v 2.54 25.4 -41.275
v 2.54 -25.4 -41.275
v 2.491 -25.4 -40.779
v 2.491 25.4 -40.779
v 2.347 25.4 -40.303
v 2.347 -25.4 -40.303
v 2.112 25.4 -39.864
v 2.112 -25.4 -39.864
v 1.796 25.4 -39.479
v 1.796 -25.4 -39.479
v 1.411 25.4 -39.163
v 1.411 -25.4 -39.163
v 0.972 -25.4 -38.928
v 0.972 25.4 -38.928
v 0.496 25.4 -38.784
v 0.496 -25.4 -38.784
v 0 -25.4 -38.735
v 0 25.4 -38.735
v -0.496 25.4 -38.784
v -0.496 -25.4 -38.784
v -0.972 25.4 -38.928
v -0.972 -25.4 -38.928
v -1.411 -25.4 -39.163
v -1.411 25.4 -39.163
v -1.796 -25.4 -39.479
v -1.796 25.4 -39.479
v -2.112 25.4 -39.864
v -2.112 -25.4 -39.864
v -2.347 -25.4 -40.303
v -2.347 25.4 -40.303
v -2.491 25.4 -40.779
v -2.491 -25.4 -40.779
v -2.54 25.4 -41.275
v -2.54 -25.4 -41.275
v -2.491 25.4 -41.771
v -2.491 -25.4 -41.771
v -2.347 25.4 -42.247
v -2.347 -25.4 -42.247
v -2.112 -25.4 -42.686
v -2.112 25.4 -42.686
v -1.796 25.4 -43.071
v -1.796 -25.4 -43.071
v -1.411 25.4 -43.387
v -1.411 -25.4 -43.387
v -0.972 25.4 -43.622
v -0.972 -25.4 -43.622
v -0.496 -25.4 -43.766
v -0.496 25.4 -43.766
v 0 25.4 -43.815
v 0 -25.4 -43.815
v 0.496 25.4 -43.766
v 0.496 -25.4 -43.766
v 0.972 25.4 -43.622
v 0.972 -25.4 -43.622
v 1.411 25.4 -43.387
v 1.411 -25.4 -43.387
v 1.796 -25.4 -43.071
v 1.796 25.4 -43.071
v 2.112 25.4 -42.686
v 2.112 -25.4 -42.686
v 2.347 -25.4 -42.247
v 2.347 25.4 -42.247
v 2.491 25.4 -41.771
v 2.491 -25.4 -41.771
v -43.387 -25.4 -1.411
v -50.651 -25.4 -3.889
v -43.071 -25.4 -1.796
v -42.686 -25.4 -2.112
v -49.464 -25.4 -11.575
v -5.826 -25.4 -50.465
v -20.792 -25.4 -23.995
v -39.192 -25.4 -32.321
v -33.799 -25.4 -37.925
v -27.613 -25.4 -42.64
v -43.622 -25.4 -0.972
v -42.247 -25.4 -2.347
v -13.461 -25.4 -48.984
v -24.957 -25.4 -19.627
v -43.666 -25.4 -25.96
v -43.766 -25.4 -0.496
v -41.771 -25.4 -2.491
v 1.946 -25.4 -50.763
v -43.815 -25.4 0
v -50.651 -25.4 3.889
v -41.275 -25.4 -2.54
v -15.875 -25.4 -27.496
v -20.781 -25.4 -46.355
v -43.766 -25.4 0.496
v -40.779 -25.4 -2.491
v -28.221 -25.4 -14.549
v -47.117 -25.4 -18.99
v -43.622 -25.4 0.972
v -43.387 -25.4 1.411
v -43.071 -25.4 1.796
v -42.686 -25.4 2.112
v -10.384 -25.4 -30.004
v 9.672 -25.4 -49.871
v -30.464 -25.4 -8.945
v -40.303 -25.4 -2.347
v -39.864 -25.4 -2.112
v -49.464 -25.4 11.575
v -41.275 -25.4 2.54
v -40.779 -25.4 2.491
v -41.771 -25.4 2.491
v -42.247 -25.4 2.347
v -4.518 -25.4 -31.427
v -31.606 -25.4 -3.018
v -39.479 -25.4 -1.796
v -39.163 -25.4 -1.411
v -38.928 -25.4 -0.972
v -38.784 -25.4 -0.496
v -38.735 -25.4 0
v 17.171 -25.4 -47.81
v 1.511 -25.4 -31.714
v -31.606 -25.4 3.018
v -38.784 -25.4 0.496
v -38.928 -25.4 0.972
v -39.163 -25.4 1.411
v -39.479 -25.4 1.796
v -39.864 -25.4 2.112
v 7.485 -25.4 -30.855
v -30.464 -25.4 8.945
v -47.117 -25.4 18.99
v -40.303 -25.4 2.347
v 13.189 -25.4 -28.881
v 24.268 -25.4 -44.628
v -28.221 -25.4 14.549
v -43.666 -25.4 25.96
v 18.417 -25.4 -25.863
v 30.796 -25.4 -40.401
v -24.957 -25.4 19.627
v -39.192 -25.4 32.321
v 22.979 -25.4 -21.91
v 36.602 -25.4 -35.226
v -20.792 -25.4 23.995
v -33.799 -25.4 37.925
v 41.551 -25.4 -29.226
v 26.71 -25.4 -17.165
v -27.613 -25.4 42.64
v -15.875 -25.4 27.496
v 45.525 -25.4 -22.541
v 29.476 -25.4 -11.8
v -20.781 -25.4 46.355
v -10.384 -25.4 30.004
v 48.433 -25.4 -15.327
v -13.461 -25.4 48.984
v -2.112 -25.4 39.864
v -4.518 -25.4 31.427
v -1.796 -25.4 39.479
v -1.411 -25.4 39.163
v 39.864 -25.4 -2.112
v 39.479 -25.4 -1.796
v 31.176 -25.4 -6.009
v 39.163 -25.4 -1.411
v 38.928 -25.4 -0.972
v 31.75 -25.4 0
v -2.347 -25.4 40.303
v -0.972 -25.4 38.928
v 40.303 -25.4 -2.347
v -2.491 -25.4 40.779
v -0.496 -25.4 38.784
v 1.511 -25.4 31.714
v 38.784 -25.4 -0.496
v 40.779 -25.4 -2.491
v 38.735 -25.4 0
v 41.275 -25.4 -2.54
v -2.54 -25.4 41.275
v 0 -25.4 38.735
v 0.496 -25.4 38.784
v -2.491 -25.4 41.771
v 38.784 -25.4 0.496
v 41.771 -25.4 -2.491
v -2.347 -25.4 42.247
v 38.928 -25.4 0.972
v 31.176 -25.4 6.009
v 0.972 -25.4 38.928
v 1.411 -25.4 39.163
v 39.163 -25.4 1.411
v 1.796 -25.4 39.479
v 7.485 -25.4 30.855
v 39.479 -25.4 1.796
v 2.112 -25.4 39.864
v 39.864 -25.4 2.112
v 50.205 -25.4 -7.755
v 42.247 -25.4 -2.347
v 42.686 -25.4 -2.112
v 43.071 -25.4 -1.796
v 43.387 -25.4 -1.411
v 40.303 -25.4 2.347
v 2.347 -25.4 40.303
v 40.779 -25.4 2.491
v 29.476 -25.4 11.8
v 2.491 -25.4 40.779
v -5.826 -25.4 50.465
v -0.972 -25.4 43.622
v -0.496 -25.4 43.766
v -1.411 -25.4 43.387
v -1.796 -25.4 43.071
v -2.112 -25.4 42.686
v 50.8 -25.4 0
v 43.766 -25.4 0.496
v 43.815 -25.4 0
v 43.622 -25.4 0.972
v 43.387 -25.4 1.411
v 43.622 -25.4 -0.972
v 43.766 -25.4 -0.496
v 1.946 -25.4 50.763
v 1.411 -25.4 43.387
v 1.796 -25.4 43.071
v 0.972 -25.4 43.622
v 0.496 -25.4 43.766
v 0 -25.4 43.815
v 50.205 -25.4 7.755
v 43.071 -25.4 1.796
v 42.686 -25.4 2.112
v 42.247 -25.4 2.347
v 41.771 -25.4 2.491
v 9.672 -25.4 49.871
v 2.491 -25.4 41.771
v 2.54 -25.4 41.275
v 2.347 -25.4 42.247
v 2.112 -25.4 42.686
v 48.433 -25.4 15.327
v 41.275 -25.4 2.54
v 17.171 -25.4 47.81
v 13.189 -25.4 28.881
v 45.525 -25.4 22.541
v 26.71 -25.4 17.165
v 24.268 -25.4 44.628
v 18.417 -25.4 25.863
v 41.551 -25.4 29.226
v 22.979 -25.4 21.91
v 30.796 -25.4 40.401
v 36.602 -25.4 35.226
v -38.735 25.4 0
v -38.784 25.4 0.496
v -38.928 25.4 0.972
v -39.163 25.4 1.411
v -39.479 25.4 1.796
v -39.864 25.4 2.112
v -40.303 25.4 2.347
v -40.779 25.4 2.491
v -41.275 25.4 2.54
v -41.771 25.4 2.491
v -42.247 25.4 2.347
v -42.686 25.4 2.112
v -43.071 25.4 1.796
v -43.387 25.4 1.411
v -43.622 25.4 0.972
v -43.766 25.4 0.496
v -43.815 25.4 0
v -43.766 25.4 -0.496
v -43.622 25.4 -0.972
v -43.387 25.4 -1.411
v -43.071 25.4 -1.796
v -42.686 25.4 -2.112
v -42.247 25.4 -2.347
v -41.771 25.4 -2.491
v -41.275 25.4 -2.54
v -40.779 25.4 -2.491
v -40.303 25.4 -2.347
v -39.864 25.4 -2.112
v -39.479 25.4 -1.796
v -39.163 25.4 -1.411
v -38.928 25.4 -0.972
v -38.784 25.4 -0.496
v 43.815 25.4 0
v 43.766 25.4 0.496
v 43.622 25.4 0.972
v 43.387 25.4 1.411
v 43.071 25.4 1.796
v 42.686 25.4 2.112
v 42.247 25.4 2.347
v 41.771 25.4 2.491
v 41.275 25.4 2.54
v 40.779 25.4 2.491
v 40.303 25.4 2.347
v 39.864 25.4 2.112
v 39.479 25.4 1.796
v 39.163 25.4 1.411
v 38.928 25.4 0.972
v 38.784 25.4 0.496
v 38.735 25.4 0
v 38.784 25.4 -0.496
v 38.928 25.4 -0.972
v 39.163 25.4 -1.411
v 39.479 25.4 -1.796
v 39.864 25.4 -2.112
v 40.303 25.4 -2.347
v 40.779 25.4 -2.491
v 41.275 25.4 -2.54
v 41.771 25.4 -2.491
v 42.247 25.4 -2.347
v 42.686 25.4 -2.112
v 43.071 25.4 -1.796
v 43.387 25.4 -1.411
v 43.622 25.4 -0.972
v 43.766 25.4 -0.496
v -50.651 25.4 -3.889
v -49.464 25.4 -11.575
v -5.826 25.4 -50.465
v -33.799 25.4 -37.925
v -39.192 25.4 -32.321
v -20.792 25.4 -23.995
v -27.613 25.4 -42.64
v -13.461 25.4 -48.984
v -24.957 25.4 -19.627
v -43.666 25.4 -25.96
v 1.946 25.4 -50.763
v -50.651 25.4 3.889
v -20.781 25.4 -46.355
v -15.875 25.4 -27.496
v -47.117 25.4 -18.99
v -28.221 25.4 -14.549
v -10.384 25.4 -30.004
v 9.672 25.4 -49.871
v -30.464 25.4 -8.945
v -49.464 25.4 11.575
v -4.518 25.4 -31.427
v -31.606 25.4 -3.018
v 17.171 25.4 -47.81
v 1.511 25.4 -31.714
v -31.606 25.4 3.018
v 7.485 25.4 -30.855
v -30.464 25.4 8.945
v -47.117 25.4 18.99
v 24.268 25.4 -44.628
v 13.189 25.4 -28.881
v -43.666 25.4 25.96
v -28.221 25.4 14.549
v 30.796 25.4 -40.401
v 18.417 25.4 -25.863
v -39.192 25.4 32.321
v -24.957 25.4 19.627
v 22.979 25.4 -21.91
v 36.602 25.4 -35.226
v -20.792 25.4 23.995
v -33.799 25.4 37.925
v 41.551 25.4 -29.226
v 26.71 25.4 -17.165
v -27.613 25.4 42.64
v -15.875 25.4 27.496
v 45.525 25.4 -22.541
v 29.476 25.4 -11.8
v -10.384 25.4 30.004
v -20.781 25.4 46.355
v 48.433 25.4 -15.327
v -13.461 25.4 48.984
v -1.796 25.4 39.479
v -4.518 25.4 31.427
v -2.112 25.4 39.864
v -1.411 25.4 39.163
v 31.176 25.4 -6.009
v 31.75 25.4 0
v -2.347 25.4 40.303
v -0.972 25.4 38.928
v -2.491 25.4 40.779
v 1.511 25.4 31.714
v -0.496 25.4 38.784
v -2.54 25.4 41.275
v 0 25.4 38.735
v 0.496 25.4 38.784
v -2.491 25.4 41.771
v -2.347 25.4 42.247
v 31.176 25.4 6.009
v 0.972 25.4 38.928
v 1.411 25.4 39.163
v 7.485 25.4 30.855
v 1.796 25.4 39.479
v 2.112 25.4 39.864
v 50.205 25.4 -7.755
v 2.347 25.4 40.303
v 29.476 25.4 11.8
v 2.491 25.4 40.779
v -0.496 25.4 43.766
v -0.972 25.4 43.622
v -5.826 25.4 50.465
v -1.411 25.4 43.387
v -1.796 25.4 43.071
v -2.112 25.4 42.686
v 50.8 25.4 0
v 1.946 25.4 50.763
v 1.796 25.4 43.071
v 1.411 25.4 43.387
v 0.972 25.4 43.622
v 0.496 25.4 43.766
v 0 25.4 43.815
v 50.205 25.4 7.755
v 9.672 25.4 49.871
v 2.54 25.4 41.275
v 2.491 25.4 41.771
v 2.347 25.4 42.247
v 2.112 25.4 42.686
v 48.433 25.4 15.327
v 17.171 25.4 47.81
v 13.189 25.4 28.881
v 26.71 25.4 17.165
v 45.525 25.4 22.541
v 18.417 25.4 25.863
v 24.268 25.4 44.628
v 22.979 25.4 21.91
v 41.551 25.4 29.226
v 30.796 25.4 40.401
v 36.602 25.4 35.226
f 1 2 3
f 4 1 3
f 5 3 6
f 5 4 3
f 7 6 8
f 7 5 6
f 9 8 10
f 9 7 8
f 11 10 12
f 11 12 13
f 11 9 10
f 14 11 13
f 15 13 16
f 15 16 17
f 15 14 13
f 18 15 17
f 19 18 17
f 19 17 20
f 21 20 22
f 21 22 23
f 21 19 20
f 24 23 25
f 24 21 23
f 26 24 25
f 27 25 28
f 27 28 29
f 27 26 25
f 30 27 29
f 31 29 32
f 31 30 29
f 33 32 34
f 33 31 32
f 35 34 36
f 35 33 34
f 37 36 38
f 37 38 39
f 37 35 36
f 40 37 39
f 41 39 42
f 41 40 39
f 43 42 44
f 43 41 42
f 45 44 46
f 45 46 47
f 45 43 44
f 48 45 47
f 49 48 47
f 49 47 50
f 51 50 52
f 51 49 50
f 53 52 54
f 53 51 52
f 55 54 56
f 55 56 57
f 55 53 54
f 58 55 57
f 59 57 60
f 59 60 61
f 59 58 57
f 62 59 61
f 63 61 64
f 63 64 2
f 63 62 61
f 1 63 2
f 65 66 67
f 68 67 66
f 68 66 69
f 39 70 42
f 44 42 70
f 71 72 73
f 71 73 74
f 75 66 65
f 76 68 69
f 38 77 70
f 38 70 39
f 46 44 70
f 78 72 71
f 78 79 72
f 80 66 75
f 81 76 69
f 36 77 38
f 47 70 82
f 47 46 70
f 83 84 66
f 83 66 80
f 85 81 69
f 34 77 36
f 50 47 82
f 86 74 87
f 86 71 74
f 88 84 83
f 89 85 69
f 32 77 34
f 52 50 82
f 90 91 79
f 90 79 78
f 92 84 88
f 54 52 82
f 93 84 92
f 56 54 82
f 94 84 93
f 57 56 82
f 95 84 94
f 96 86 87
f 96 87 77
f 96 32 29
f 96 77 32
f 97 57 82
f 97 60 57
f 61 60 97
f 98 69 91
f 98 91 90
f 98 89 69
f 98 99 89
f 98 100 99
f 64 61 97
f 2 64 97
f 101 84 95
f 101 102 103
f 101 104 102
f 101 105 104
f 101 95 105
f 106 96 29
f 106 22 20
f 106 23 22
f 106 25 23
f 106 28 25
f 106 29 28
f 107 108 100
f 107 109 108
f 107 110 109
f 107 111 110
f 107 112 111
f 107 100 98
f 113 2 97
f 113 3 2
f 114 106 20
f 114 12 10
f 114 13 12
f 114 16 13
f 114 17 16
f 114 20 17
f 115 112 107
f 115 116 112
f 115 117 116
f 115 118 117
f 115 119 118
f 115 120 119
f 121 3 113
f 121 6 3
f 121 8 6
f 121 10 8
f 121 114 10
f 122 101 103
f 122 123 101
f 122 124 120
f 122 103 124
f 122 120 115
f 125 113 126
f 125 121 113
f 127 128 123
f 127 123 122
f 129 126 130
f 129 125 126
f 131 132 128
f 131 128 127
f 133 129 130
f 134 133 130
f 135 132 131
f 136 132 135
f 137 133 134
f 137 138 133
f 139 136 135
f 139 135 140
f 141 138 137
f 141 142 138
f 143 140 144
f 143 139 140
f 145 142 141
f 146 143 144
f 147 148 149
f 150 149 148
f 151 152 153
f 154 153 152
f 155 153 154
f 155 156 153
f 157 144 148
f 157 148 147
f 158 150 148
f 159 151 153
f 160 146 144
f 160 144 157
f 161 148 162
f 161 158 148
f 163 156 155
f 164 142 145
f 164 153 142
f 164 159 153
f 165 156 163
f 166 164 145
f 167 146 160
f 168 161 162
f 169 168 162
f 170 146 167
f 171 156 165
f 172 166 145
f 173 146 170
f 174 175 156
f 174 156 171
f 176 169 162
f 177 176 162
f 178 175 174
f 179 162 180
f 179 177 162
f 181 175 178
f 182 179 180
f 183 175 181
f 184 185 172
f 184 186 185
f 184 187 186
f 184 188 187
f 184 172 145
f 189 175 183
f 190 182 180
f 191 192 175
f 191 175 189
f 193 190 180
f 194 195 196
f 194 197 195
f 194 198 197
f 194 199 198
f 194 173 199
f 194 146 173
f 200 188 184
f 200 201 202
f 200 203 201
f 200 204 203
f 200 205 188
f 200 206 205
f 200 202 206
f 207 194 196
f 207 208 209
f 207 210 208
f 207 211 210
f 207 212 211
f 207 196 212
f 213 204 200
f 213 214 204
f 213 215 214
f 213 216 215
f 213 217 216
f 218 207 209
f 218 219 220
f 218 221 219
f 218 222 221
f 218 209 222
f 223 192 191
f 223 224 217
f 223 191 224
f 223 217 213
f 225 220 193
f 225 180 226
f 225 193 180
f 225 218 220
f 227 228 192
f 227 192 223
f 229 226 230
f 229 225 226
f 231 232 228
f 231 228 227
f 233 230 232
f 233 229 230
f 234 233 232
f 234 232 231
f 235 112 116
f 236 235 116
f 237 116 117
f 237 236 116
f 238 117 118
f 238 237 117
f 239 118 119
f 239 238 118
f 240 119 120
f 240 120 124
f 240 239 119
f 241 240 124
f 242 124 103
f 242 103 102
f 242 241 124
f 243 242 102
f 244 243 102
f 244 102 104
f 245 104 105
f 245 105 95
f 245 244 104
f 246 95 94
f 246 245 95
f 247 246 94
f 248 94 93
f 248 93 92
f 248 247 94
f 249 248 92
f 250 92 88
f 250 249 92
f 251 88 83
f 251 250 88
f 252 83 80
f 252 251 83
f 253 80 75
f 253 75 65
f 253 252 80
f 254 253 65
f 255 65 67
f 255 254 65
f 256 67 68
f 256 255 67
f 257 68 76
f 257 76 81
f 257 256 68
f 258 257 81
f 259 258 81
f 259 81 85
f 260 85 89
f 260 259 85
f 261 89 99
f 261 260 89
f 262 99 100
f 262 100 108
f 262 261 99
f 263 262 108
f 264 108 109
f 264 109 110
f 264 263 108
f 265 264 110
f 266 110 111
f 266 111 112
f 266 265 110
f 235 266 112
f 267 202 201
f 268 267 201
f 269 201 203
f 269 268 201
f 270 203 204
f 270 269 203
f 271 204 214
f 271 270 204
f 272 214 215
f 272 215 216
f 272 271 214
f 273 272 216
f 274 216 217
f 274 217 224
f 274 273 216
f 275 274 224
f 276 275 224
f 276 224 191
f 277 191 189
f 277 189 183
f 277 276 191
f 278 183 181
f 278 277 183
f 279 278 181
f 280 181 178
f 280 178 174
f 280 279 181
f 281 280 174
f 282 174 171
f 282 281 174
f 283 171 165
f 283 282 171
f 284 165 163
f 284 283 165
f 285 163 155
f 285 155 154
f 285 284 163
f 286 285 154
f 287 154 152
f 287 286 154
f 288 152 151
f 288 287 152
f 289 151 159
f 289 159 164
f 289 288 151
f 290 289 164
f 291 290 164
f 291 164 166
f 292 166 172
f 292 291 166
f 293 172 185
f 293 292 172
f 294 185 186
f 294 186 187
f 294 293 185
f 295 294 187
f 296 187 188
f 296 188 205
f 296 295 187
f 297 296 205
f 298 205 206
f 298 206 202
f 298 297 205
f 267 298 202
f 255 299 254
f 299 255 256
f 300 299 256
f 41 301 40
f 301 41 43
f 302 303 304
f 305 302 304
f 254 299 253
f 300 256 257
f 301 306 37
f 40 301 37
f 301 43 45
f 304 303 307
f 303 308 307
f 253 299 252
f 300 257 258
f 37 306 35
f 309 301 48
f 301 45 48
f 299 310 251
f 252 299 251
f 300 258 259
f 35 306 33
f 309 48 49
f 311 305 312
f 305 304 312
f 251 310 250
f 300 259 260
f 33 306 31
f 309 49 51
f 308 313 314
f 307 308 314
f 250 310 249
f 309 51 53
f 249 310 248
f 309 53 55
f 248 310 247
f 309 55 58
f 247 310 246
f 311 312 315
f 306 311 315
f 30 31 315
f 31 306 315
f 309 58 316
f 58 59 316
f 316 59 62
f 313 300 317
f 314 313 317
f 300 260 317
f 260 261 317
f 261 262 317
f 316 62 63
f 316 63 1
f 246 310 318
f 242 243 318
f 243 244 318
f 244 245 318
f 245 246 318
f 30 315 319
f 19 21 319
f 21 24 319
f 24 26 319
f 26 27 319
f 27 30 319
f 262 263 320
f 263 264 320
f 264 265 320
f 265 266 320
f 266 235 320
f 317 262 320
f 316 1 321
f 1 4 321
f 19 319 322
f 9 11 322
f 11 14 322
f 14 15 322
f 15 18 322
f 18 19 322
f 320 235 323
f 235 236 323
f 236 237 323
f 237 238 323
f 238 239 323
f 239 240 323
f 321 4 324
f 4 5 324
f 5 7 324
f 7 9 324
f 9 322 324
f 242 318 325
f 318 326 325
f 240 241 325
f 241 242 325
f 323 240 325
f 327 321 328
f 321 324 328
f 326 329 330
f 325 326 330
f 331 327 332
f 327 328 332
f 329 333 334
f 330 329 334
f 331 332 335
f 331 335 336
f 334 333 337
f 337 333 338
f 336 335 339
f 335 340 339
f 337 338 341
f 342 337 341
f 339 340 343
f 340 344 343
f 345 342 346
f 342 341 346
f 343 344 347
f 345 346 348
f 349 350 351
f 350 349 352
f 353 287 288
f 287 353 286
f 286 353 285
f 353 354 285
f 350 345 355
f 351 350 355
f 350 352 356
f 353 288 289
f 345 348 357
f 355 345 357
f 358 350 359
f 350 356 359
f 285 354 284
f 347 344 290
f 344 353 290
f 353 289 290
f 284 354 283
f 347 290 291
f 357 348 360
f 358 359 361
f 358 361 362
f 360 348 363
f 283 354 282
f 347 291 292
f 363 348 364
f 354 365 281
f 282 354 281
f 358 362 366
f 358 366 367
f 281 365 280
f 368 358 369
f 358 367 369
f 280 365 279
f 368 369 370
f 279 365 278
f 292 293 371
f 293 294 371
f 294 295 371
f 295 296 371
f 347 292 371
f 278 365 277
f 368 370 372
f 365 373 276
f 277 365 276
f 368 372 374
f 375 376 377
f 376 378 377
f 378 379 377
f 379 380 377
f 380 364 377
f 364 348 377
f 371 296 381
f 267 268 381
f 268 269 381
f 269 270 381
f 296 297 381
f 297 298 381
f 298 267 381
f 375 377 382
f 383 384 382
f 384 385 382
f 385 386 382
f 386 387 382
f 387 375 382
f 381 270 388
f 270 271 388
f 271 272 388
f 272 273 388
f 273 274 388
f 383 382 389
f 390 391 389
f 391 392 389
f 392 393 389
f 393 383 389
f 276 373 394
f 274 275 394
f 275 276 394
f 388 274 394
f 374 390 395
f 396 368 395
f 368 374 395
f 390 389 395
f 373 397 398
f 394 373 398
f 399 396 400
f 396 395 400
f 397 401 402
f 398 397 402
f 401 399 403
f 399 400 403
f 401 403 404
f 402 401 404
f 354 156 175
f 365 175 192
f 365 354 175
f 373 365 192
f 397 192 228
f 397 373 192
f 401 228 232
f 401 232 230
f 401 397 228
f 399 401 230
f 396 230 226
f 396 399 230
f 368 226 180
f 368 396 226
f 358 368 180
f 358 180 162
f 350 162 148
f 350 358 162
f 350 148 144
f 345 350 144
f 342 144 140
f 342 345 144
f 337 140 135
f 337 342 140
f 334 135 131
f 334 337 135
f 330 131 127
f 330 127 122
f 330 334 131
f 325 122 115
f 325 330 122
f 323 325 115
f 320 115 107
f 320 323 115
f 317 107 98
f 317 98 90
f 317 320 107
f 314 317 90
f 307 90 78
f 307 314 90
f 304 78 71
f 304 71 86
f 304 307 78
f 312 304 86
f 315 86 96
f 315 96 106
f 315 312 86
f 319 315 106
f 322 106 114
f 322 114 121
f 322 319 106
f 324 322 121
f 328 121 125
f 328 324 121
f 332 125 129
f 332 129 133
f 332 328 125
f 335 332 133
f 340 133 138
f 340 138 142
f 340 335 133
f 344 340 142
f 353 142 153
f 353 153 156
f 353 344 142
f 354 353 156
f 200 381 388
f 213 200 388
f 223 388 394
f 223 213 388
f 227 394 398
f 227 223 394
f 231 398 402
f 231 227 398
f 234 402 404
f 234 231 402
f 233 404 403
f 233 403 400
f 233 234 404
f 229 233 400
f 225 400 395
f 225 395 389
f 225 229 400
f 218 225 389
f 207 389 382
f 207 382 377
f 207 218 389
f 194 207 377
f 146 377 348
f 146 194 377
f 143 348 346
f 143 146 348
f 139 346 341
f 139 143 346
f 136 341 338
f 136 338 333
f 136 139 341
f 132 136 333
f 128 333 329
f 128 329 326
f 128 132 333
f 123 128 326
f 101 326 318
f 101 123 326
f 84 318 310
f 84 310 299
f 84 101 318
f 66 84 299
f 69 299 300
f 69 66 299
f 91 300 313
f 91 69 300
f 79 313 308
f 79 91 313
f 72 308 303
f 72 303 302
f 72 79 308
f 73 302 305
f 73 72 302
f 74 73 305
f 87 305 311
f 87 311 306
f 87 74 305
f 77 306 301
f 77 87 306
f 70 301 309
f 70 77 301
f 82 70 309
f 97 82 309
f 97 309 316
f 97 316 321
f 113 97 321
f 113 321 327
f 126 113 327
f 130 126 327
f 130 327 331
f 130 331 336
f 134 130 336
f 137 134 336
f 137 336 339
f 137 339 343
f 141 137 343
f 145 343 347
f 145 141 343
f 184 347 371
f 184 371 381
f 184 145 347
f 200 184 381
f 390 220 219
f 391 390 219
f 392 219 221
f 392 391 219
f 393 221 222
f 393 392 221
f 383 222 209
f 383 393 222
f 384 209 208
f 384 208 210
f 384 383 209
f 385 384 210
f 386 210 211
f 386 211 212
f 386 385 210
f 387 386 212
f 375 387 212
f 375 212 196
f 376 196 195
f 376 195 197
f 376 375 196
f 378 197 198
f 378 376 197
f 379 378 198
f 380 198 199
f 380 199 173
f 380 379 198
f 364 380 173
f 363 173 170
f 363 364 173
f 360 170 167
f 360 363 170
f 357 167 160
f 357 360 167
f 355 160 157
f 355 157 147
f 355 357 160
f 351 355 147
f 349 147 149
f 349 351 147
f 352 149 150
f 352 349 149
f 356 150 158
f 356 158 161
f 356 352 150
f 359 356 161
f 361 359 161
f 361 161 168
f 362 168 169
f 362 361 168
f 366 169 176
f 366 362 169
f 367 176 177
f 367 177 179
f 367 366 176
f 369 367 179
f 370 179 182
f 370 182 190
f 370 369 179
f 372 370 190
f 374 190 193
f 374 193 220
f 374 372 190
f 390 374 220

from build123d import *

# Parameters (mm, degrees)
F0_R     = 50.8
F0_R_2   = 2.54
F0_R_3   = 31.75
F1_DEPTH = 25.4


with BuildPart() as f1:
    # F0 (on Front) → F1 (new body, symmetric)
    with BuildSketch(Plane.XZ):
        Circle(F0_R)
        with Locations((0, -41.275)):
            Circle(F0_R_2, mode=Mode.SUBTRACT)
        with Locations((-41.275, 0)):
            Circle(F0_R_2, mode=Mode.SUBTRACT)
        Circle(F0_R_3, mode=Mode.SUBTRACT)
        with Locations((41.275, 0)):
            Circle(F0_R_2, mode=Mode.SUBTRACT)
        with Locations((0, 41.275)):
            Circle(F0_R_2, mode=Mode.SUBTRACT)
    extrude(amount=F1_DEPTH, both=True)


solid = f1.part
